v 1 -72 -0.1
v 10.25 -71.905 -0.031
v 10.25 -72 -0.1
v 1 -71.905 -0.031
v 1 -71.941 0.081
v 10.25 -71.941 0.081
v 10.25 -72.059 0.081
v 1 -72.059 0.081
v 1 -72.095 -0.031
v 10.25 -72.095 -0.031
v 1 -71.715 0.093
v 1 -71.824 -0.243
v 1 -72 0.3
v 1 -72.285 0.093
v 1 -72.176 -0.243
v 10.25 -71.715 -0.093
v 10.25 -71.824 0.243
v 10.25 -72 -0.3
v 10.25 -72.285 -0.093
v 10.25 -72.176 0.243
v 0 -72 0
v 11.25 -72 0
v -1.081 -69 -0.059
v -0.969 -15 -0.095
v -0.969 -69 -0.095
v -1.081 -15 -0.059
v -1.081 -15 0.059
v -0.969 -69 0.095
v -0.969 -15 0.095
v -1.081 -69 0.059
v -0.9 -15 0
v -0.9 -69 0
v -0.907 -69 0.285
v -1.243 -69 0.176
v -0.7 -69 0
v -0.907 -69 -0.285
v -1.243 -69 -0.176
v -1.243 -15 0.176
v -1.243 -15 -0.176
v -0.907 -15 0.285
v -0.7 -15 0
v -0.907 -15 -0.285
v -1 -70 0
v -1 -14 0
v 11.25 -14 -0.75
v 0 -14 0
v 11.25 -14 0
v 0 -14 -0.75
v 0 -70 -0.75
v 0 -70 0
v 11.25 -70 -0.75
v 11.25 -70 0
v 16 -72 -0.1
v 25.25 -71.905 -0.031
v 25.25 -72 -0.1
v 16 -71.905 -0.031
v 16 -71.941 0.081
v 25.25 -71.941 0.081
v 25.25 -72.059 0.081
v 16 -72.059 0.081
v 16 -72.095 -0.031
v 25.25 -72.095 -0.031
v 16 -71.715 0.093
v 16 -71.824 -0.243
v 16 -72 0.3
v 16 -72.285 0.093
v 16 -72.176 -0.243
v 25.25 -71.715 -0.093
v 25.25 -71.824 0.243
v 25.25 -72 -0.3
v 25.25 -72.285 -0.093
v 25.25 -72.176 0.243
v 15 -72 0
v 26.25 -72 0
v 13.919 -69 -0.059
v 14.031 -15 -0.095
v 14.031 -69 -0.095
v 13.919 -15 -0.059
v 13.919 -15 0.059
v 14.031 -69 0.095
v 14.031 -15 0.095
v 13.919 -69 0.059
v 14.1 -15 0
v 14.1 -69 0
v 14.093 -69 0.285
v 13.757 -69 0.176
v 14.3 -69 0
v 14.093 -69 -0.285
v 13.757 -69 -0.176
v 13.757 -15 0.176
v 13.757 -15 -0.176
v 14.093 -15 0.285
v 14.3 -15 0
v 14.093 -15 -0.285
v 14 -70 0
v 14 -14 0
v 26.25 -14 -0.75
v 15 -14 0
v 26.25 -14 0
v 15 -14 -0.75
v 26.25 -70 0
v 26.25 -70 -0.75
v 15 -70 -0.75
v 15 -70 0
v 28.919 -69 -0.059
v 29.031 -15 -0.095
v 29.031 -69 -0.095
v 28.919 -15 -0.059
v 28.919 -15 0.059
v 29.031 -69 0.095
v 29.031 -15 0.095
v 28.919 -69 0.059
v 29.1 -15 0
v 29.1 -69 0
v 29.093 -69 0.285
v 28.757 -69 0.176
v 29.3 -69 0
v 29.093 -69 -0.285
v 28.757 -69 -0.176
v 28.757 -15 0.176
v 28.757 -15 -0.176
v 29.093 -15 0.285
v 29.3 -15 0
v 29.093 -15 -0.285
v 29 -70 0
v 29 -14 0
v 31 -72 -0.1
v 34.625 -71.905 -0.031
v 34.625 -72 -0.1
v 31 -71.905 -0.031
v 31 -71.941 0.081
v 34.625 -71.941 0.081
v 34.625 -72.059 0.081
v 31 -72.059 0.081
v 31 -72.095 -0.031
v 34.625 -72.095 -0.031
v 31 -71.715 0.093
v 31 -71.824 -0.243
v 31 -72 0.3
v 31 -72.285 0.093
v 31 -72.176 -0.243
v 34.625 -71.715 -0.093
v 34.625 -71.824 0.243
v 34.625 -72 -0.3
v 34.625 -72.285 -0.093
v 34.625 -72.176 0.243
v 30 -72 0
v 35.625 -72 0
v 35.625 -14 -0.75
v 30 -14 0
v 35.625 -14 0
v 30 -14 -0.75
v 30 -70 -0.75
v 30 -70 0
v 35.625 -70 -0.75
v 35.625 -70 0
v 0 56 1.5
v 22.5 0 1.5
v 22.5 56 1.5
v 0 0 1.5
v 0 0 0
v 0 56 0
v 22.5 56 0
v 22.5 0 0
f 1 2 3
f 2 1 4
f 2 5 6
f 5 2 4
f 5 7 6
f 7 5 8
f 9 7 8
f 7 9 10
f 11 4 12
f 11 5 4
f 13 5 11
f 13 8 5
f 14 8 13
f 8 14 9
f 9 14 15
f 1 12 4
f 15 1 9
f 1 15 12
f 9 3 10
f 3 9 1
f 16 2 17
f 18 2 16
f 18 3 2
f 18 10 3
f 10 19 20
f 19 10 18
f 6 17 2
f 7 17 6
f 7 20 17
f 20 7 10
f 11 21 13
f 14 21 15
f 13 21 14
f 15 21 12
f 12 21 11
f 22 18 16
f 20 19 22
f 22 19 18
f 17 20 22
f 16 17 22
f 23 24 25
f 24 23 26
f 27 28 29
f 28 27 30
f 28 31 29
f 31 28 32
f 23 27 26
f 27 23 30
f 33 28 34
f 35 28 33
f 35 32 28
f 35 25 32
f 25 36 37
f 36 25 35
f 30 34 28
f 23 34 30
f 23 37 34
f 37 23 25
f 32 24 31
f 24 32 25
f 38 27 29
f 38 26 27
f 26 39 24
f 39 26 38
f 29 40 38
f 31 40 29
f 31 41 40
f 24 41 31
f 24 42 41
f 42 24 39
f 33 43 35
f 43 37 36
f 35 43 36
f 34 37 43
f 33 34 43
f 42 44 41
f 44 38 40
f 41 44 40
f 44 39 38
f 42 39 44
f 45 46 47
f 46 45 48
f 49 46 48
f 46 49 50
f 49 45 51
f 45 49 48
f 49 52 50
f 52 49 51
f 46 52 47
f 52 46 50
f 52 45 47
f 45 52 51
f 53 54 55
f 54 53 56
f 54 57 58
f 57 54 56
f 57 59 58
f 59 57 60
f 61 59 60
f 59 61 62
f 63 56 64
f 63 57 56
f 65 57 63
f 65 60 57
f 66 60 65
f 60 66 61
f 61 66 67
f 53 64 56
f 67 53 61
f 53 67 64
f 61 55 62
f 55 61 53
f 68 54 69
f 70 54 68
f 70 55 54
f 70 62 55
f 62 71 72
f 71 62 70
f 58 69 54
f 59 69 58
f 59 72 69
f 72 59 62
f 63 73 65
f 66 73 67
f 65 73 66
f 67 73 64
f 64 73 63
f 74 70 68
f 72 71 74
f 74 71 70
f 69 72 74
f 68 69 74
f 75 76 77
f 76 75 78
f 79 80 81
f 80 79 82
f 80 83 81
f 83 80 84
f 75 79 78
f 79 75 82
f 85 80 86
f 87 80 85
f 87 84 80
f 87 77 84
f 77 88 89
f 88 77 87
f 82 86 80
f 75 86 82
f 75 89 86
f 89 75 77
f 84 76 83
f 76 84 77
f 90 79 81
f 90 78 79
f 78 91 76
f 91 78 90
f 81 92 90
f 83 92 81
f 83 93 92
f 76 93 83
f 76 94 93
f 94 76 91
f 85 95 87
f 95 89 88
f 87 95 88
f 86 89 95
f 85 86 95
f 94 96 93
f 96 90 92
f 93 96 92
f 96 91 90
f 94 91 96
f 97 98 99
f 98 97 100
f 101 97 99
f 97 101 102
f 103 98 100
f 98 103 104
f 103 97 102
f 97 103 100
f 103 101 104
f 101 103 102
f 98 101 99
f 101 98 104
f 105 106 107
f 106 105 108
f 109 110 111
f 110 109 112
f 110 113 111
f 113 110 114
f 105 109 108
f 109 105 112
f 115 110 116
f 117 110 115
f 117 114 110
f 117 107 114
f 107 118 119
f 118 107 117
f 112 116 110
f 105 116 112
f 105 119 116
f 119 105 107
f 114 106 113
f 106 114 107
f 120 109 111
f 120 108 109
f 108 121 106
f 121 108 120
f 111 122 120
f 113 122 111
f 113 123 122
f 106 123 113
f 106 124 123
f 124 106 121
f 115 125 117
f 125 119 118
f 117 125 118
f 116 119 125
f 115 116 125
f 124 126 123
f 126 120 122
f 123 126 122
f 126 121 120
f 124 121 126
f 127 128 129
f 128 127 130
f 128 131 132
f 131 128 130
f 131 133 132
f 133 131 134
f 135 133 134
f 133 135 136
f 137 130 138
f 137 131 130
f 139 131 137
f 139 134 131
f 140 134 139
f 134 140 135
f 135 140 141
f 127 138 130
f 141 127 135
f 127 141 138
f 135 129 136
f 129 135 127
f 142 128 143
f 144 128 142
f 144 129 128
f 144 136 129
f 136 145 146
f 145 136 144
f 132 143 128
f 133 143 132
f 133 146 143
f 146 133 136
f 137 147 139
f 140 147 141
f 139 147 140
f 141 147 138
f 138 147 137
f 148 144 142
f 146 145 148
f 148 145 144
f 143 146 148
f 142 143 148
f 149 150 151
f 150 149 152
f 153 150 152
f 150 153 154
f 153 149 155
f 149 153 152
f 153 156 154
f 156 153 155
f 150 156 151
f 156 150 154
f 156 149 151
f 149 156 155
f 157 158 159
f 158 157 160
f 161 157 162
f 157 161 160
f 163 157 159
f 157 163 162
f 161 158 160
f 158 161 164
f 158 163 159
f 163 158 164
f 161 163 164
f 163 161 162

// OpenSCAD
// file: ../lib/common.scad
//--------------------------------------------------------------------------------------------------
// Module Prism
//--------------------------------------------------------------------------------------------------
module prism(z, y, x)
{
    rotate([0, 90, 0])
    {
        polyhedron(
                points=[[0,0,0], [x,0,0], [x,y,0], [0,y,0], [0,y,z], [x,y,z]],
                faces=[[0,1,2,3],[5,4,3,2],[0,4,5,1],[0,3,4],[5,2,1]]);
    }
}

//--------------------------------------------------------------------------------------------------
// Module Side panel
//--------------------------------------------------------------------------------------------------
module rect_cut(x, y, z, dx, dy)
{
    // Top panel
    translate([0, dy, 0])
    {
        cube([x, y - dy, z]);
    };

    // Left bottom panel
    translate([0, 0, 0])
    {
        cube([dx, dy, z]);
    };

    // Triangle
    translate([dx, 0, 0])
    {
        rotate([0, 0, 0])
        {
            prism(x - dx, dy, -z);
        }
    };
}

//--------------------------------------------------------------------------------------------------
// X dimensional arrow
//--------------------------------------------------------------------------------------------------
module arrow_x(l)
{
    line_w = 0.1;
    arrow_w = 1;
    arrow_h = 0.3;

    // Line
    translate([l / 2, 0, 0])
    {
        rotate([0, 90, 0])
        {
            color([0.4, 0.4, 0.4])
            cylinder(l - arrow_w * 2, line_w, line_w, true);
        }
    }

    // Left arrow
    translate([arrow_w, 0, 0])
    {
        rotate([0, 270, 0])
        {
            color([0.4, 0.4, 0.4])
            cylinder(arrow_w, arrow_h, 0, false);
        }
    }

    // Right arrow
    translate([l - arrow_w, 0, 0])
    {
        rotate([0, 90, 0])
        {
            color([0.4, 0.4, 0.4])
            cylinder(arrow_w, arrow_h, 0, false);
        }
    }

    // Text
    translate([l/3, 0.5, 0])
    {
        color([0.4, 0.4, 0.4])
        text(str(l), size=1);
    }
}

//--------------------------------------------------------------------------------------------------
// Y dimensional arrow
//--------------------------------------------------------------------------------------------------
module arrow_y(l)
{
    line_w = 0.1;
    arrow_w = 1;
    arrow_h = 0.3;

    // Line
    translate([0, l / 2, 0])
    {
        rotate([90, 0, 00])
        {
            color([0.4, 0.4, 0.4])
            cylinder(l - arrow_w * 2, line_w, line_w, true);
        }
    }

    // Left arrow
    translate([0 ,arrow_w, 0])
    {
        rotate([90, 0, 0])
        {
            color([0.4, 0.4, 0.4])
            cylinder(arrow_w, arrow_h, 0, false);
        }
    }

    // Right arrow
    translate([0, l - arrow_w, 0])
    {
        rotate([270, 0, 0])
        {
            color([0.4, 0.4, 0.4])
            cylinder(arrow_w, arrow_h, 0, false);
        }
    }

    // Text
    translate([-0.5, l/3, 0])
    {
        rotate([0 ,0, 90])
        {
            color([0.4, 0.4, 0.4])
            text(str(l), size=1);
        }
    }
}

//--------------------------------------------------------------------------------------------------
// Z dimensional arrow
//--------------------------------------------------------------------------------------------------
module arrow_z(l)
{
    line_w = 0.11;
    arrow_w = 1;
    arrow_h = 0.3;

    // Line
    translate([0, 0, l / 2])
    {
        rotate([0, 0, 0])
        {
            color([0.4, 0.4, 0.4])
            cylinder(l - arrow_w * 2, line_w, line_w, true);
        }
    }

    // Left arrow
    translate([0, 0, arrow_w])
    {
        rotate([0, 180, 0])
        {
            color([0.4, 0.4, 0.4])
            cylinder(arrow_w, arrow_h, 0, false);
        }
    }

    // Right arrow
    translate([0, 0, l - arrow_w])
    {
        rotate([0, 0, 0])
        {
            color([0.4, 0.4, 0.4])
            cylinder(arrow_w, arrow_h, 0, false);
        }
    }

    // Text
    translate([0.5, 0, l/3])
    {
        rotate([90 ,0, 90])
        {
            color([0.4, 0.4, 0.4])
            text(str(l), size=1);
        }
    }
}

//--------------------------------------------------------------------------------------------------
// parallelogram
//--------------------------------------------------------------------------------------------------
module parallelogram(x = 12, y = 12, z = 1, xd = 0)
{
    points = [
        [0, 0, 0 ],        //0
        [x, 0, 0 ],        //1
        [x + xd, y, 0],    //2
        [xd, y, 0 ],       //3
        [0, 0, z ],        //4
        [x, 0, z ],        //5
        [x + xd, y, z ],   //6
        [xd, y, z ]];      //7

    faces = [
        [0,1,2,3],         // bottom
        [4,5,1,0],         // front
        [7,6,5,4],         // top
        [5,6,2,1],         // right
        [6,7,3,2],         // back
        [7,4,0,3]];        // left

    polyhedron(points, faces);
}

//--------------------------------------------------------------------------------------------------
// common board
//--------------------------------------------------------------------------------------------------
module board(w, h, d, r, g, b)
{
    color([r, g, b])
    cube([w, h, d]);
}

//--------------------------------------------------------------------------------------------------
// board dimension
//--------------------------------------------------------------------------------------------------
module dimension(w, h, d, r, g, b, part_x, part_y)
{
    translate([part_x, -part_y, 0])
    {
        rotate([-90, 0, 0])
        {
            board(w, h, d, r, g, b);
        }
            
        translate([0, -2, 0])
        {
            color([0, 0, 0])
            arrow_x(w);
        };

        translate([-1, 0, 0])
        {
            color([0, 0, 0])
            arrow_y(d);
        };
    }
}
// main file
/*
29 X 56
11.25 X 2 X 6ft = 22.5 : $34.5 X 2 = $69

Poplar: 1 X 10 ft 
Pine:   1 X 10 ft
*/

include <../lib/common.scad>

// Top
// 56.25 X 2 = 112.5
// 1 X 10 ft
translate([0, 0, 0.75])
{
    board(11.25, 56, 0.75, 0, 1, 0);
}
dimension(11.25, 0.75, 56, 0, 1, 0, 0, 70);

translate([11.25, 0, 0.75])
{
    board(11.25, 56, 0.75, 0, 1, 0);
}

// Bottom
// 22.5 X 5 = 122.5
// 1 X 10 ft pine board
translate([5.625, 0, 0])
{
    board(11.25, 56, 0.75, 1, 0, 0);
}
dimension(11.25, 0.75, 56, 1, 0, 0, 15, 70);

translate([0, 0, 0])
{
    board(5.625, 56, 0.75, 0, 0, 1);
}
dimension(5.625, 0.75, 56, 0, 0, 1, 30, 70);

translate([16.875, 0, 0])
{
    board(5.625, 56, 0.75, 0, 0, 1);
}
